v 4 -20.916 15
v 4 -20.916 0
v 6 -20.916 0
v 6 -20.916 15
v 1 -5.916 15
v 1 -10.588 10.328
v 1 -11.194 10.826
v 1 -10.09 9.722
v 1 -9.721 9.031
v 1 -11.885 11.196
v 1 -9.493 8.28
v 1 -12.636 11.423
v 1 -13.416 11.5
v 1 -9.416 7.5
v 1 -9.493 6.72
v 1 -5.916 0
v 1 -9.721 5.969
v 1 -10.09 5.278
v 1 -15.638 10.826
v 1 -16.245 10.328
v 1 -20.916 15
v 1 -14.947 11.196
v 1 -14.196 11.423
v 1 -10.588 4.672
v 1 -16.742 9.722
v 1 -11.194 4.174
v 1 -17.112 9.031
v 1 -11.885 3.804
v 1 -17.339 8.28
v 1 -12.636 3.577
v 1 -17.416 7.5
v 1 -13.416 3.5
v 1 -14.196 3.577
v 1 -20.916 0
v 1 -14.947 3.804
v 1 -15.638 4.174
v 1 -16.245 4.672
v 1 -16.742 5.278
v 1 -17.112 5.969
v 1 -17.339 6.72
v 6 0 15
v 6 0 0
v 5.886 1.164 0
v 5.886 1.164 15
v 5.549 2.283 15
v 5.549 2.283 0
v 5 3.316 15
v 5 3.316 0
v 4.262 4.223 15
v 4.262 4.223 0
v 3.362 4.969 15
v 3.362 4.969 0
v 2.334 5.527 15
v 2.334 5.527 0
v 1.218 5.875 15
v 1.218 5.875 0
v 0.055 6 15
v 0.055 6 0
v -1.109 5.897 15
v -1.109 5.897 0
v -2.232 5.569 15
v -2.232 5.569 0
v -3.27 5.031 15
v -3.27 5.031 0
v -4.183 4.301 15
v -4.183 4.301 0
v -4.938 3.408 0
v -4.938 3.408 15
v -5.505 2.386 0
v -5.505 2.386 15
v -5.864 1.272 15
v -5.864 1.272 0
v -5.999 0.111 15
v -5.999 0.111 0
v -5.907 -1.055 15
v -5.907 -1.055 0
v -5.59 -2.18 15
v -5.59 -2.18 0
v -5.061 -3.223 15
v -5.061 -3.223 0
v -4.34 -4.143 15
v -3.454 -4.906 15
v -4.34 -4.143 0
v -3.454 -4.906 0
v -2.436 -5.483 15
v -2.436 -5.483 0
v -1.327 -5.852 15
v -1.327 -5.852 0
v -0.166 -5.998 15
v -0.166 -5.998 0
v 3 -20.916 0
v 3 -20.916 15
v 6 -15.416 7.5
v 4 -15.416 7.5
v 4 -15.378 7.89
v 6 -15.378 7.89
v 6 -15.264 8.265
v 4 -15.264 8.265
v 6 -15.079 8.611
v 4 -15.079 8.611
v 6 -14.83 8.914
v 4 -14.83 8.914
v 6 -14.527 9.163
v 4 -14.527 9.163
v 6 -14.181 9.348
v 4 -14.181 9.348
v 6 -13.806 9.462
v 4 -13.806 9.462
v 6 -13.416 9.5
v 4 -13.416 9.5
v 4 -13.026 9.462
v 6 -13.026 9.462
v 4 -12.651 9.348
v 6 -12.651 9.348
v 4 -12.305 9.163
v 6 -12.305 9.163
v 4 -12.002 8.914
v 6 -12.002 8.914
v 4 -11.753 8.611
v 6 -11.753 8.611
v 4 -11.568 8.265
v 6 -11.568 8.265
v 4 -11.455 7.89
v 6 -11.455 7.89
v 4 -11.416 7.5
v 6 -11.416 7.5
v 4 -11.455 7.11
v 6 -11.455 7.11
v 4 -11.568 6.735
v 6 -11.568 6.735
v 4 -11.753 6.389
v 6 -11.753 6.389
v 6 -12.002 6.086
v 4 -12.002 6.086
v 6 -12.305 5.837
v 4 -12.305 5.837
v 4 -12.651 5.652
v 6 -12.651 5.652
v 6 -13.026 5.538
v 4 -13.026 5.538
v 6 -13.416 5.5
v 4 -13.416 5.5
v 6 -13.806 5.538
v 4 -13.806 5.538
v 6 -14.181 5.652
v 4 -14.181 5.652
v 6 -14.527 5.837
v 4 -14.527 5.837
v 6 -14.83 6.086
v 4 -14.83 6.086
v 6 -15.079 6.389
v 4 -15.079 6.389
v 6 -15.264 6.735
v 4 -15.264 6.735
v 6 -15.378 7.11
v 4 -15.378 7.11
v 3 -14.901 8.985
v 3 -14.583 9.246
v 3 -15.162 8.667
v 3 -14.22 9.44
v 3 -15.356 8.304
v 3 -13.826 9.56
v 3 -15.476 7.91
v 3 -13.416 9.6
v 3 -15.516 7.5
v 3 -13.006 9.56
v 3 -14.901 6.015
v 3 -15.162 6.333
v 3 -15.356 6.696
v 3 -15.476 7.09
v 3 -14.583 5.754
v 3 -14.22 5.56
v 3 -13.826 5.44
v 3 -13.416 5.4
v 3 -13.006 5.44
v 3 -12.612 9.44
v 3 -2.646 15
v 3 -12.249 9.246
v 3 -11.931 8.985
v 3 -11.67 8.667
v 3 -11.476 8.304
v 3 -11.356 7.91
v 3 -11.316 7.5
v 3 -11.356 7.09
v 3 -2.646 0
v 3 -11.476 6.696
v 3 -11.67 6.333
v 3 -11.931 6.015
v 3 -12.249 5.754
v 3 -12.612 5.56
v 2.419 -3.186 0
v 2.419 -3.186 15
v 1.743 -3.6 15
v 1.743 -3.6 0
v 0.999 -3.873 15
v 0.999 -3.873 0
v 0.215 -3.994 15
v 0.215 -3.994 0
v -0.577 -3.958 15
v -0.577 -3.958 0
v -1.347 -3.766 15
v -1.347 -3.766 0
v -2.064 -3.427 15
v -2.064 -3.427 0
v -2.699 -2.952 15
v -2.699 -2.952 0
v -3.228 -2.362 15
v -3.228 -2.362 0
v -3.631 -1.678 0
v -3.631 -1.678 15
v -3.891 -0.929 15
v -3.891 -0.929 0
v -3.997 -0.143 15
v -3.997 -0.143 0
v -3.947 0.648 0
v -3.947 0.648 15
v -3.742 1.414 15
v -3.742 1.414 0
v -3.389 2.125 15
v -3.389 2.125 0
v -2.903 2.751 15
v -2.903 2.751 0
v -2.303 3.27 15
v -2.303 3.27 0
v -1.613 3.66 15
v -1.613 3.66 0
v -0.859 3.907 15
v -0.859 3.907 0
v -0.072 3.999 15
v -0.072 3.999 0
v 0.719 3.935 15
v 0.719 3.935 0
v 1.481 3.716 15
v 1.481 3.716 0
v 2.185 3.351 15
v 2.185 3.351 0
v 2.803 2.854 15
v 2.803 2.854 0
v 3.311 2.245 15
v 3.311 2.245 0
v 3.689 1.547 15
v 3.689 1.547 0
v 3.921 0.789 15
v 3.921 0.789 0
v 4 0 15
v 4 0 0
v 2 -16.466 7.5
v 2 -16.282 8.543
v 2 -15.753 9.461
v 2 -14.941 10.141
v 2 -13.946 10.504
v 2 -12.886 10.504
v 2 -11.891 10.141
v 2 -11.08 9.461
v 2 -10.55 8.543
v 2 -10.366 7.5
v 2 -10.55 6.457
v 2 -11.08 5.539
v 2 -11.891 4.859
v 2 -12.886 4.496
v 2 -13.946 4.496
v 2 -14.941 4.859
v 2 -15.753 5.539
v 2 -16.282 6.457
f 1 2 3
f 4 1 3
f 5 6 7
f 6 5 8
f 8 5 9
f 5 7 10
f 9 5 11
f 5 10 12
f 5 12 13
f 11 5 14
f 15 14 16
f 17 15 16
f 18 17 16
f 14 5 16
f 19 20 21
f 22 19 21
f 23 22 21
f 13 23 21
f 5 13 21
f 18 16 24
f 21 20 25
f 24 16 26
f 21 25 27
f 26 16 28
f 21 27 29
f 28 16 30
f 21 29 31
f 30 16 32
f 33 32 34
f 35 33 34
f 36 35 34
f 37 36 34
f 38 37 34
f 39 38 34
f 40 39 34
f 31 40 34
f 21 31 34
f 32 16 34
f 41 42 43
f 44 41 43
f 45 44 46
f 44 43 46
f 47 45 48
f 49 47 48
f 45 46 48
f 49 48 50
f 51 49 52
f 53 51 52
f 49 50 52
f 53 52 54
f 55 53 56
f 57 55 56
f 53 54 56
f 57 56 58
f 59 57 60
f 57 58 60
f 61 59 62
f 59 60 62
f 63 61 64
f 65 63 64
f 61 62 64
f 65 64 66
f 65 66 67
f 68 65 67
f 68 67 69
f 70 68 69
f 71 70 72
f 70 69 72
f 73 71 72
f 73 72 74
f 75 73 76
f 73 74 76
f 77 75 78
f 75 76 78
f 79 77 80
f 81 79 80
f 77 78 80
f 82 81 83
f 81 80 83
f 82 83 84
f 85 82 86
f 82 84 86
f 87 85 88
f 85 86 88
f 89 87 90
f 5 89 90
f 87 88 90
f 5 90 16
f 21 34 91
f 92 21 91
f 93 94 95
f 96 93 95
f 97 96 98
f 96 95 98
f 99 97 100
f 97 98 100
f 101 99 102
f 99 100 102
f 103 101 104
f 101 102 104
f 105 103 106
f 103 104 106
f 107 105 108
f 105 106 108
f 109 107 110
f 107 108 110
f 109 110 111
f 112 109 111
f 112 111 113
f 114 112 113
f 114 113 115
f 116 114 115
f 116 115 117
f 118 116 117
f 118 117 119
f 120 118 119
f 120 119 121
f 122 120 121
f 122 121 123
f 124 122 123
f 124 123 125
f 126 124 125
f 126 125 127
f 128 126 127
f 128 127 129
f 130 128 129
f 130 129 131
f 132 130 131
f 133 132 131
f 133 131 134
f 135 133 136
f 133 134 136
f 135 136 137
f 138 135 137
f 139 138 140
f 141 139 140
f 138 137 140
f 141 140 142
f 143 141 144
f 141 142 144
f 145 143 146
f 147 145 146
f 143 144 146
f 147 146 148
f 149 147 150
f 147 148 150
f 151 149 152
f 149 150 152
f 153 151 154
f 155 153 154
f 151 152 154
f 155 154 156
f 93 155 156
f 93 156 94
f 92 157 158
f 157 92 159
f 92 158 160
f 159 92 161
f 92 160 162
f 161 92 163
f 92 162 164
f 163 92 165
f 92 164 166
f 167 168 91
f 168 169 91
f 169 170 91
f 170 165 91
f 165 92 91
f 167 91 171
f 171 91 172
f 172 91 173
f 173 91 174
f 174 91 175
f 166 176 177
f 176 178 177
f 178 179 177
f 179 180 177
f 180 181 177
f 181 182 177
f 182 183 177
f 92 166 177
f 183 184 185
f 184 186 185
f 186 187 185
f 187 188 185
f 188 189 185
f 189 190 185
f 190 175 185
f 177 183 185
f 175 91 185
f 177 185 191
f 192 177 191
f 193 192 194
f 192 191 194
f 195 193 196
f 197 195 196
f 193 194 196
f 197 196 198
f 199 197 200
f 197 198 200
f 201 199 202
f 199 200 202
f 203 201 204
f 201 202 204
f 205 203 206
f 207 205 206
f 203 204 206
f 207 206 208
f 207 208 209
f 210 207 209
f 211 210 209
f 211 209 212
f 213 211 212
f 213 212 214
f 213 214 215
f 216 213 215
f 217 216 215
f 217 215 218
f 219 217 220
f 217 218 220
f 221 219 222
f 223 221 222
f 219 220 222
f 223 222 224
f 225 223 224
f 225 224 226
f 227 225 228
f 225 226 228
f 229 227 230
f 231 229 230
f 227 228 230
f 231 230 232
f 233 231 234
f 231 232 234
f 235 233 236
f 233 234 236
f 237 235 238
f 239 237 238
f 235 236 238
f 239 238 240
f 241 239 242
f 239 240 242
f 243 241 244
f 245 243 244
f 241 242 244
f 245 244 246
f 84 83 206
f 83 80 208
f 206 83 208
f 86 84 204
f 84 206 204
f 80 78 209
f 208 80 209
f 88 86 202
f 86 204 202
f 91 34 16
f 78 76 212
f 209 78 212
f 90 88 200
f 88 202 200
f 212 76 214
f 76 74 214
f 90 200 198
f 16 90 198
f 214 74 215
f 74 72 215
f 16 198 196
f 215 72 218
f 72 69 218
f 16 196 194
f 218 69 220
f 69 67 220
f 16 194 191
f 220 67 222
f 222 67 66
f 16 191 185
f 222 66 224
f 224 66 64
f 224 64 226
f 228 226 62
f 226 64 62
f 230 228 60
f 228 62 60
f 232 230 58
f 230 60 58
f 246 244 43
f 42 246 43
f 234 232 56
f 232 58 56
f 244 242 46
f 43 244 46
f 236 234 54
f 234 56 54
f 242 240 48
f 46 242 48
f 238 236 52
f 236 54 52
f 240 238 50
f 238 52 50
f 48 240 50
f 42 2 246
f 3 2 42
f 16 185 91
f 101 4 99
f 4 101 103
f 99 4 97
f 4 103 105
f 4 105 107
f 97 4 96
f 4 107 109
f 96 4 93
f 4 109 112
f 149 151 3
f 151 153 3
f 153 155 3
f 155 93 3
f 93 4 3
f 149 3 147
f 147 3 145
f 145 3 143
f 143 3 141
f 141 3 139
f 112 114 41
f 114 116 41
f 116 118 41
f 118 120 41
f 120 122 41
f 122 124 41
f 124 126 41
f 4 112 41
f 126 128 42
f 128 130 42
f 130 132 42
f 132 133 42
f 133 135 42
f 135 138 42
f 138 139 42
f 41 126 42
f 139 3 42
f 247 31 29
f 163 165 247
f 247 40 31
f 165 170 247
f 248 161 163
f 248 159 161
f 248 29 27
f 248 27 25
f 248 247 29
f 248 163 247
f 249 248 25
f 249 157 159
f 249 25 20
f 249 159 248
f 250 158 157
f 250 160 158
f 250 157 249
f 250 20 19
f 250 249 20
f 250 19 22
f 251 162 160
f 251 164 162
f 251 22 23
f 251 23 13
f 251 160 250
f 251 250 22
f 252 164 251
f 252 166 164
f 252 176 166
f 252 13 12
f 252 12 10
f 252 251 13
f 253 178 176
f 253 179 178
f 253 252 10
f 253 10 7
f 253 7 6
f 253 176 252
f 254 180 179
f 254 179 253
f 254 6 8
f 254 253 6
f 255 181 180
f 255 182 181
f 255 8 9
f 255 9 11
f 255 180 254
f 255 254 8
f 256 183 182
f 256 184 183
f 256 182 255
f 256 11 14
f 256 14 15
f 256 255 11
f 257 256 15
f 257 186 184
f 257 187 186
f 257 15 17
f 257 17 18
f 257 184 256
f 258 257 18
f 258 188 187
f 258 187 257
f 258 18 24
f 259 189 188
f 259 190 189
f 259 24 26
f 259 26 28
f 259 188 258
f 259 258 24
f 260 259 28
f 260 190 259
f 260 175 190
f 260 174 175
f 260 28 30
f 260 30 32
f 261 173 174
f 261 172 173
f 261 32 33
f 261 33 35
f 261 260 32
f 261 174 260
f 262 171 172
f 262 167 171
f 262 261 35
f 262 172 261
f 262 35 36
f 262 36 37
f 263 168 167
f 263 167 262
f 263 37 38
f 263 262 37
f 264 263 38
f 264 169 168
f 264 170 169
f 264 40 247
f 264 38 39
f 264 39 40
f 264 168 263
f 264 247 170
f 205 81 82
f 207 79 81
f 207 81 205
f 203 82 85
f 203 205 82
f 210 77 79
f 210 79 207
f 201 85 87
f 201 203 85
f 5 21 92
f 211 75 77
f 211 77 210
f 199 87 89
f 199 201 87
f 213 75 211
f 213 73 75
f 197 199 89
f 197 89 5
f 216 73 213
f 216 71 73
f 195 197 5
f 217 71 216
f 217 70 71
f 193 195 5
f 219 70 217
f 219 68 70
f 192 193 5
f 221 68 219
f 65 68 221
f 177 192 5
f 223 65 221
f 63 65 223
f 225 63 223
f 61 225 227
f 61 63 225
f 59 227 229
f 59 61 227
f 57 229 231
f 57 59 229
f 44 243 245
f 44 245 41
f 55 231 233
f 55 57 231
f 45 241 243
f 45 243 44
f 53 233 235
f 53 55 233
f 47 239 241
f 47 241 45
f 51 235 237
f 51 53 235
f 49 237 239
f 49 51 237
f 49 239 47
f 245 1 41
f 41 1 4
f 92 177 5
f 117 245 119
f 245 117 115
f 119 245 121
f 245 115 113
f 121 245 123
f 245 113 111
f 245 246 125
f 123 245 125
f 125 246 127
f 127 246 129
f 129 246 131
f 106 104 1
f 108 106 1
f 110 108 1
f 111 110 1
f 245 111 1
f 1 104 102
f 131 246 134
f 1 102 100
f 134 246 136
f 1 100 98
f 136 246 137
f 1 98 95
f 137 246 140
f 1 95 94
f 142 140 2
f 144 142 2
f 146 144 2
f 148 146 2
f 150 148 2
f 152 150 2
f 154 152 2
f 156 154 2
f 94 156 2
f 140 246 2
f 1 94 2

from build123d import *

# Parameters (mm, degrees)
F1_DEPTH = 15
F2_R     = 2
F3_DEPTH = 5
F4_R     = 4
F5_R     = 2.1


with BuildPart() as f1:
    # F0 (on Top) → F1 (new body)
    with BuildSketch(Plane.XY):
        with BuildLine():
            ThreePointArc((3, -2.645751), (-3.741657, 1.414214), (4, 0))
            Line((4, 0), (4, -20.91608))
            Line((4, -20.91608), (6, -20.91608))
            Line((6, -20.91608), (6, 0))
            ThreePointArc((6, 0), (-4.582576, 3.872983), (1, -5.91608))
            Line((1, -5.91608), (1, -20.91608))
            Line((1, -20.91608), (3, -20.91608))
            Line((3, -20.91608), (3, -2.645751))
        make_face()
    extrude(amount=F1_DEPTH)

    # F2 (on face) → F3 (cut, through all)
    with BuildSketch(Plane(origin=(1, 0, 0), x_dir=(0, -1, 0), z_dir=(-1, 0, 0))):
        with Locations((13.41608, 7.5)):
            Circle(F2_R)
    extrude(amount=-F3_DEPTH, mode=Mode.SUBTRACT)

    # F4 (on face) → F6 section 0
    with BuildSketch(Plane(origin=(1, 0, 0), x_dir=(0, -1, 0), z_dir=(-1, 0, 0))):
        with Locations((13.41608, 7.5)):
            Circle(F4_R)
    # F5 (on face) → F6 section 1
    with BuildSketch(Plane.YZ.offset(3)):
        with Locations((-13.41608, 7.5)):
            Circle(F5_R)
    loft(mode=Mode.SUBTRACT)


solid = f1.part
